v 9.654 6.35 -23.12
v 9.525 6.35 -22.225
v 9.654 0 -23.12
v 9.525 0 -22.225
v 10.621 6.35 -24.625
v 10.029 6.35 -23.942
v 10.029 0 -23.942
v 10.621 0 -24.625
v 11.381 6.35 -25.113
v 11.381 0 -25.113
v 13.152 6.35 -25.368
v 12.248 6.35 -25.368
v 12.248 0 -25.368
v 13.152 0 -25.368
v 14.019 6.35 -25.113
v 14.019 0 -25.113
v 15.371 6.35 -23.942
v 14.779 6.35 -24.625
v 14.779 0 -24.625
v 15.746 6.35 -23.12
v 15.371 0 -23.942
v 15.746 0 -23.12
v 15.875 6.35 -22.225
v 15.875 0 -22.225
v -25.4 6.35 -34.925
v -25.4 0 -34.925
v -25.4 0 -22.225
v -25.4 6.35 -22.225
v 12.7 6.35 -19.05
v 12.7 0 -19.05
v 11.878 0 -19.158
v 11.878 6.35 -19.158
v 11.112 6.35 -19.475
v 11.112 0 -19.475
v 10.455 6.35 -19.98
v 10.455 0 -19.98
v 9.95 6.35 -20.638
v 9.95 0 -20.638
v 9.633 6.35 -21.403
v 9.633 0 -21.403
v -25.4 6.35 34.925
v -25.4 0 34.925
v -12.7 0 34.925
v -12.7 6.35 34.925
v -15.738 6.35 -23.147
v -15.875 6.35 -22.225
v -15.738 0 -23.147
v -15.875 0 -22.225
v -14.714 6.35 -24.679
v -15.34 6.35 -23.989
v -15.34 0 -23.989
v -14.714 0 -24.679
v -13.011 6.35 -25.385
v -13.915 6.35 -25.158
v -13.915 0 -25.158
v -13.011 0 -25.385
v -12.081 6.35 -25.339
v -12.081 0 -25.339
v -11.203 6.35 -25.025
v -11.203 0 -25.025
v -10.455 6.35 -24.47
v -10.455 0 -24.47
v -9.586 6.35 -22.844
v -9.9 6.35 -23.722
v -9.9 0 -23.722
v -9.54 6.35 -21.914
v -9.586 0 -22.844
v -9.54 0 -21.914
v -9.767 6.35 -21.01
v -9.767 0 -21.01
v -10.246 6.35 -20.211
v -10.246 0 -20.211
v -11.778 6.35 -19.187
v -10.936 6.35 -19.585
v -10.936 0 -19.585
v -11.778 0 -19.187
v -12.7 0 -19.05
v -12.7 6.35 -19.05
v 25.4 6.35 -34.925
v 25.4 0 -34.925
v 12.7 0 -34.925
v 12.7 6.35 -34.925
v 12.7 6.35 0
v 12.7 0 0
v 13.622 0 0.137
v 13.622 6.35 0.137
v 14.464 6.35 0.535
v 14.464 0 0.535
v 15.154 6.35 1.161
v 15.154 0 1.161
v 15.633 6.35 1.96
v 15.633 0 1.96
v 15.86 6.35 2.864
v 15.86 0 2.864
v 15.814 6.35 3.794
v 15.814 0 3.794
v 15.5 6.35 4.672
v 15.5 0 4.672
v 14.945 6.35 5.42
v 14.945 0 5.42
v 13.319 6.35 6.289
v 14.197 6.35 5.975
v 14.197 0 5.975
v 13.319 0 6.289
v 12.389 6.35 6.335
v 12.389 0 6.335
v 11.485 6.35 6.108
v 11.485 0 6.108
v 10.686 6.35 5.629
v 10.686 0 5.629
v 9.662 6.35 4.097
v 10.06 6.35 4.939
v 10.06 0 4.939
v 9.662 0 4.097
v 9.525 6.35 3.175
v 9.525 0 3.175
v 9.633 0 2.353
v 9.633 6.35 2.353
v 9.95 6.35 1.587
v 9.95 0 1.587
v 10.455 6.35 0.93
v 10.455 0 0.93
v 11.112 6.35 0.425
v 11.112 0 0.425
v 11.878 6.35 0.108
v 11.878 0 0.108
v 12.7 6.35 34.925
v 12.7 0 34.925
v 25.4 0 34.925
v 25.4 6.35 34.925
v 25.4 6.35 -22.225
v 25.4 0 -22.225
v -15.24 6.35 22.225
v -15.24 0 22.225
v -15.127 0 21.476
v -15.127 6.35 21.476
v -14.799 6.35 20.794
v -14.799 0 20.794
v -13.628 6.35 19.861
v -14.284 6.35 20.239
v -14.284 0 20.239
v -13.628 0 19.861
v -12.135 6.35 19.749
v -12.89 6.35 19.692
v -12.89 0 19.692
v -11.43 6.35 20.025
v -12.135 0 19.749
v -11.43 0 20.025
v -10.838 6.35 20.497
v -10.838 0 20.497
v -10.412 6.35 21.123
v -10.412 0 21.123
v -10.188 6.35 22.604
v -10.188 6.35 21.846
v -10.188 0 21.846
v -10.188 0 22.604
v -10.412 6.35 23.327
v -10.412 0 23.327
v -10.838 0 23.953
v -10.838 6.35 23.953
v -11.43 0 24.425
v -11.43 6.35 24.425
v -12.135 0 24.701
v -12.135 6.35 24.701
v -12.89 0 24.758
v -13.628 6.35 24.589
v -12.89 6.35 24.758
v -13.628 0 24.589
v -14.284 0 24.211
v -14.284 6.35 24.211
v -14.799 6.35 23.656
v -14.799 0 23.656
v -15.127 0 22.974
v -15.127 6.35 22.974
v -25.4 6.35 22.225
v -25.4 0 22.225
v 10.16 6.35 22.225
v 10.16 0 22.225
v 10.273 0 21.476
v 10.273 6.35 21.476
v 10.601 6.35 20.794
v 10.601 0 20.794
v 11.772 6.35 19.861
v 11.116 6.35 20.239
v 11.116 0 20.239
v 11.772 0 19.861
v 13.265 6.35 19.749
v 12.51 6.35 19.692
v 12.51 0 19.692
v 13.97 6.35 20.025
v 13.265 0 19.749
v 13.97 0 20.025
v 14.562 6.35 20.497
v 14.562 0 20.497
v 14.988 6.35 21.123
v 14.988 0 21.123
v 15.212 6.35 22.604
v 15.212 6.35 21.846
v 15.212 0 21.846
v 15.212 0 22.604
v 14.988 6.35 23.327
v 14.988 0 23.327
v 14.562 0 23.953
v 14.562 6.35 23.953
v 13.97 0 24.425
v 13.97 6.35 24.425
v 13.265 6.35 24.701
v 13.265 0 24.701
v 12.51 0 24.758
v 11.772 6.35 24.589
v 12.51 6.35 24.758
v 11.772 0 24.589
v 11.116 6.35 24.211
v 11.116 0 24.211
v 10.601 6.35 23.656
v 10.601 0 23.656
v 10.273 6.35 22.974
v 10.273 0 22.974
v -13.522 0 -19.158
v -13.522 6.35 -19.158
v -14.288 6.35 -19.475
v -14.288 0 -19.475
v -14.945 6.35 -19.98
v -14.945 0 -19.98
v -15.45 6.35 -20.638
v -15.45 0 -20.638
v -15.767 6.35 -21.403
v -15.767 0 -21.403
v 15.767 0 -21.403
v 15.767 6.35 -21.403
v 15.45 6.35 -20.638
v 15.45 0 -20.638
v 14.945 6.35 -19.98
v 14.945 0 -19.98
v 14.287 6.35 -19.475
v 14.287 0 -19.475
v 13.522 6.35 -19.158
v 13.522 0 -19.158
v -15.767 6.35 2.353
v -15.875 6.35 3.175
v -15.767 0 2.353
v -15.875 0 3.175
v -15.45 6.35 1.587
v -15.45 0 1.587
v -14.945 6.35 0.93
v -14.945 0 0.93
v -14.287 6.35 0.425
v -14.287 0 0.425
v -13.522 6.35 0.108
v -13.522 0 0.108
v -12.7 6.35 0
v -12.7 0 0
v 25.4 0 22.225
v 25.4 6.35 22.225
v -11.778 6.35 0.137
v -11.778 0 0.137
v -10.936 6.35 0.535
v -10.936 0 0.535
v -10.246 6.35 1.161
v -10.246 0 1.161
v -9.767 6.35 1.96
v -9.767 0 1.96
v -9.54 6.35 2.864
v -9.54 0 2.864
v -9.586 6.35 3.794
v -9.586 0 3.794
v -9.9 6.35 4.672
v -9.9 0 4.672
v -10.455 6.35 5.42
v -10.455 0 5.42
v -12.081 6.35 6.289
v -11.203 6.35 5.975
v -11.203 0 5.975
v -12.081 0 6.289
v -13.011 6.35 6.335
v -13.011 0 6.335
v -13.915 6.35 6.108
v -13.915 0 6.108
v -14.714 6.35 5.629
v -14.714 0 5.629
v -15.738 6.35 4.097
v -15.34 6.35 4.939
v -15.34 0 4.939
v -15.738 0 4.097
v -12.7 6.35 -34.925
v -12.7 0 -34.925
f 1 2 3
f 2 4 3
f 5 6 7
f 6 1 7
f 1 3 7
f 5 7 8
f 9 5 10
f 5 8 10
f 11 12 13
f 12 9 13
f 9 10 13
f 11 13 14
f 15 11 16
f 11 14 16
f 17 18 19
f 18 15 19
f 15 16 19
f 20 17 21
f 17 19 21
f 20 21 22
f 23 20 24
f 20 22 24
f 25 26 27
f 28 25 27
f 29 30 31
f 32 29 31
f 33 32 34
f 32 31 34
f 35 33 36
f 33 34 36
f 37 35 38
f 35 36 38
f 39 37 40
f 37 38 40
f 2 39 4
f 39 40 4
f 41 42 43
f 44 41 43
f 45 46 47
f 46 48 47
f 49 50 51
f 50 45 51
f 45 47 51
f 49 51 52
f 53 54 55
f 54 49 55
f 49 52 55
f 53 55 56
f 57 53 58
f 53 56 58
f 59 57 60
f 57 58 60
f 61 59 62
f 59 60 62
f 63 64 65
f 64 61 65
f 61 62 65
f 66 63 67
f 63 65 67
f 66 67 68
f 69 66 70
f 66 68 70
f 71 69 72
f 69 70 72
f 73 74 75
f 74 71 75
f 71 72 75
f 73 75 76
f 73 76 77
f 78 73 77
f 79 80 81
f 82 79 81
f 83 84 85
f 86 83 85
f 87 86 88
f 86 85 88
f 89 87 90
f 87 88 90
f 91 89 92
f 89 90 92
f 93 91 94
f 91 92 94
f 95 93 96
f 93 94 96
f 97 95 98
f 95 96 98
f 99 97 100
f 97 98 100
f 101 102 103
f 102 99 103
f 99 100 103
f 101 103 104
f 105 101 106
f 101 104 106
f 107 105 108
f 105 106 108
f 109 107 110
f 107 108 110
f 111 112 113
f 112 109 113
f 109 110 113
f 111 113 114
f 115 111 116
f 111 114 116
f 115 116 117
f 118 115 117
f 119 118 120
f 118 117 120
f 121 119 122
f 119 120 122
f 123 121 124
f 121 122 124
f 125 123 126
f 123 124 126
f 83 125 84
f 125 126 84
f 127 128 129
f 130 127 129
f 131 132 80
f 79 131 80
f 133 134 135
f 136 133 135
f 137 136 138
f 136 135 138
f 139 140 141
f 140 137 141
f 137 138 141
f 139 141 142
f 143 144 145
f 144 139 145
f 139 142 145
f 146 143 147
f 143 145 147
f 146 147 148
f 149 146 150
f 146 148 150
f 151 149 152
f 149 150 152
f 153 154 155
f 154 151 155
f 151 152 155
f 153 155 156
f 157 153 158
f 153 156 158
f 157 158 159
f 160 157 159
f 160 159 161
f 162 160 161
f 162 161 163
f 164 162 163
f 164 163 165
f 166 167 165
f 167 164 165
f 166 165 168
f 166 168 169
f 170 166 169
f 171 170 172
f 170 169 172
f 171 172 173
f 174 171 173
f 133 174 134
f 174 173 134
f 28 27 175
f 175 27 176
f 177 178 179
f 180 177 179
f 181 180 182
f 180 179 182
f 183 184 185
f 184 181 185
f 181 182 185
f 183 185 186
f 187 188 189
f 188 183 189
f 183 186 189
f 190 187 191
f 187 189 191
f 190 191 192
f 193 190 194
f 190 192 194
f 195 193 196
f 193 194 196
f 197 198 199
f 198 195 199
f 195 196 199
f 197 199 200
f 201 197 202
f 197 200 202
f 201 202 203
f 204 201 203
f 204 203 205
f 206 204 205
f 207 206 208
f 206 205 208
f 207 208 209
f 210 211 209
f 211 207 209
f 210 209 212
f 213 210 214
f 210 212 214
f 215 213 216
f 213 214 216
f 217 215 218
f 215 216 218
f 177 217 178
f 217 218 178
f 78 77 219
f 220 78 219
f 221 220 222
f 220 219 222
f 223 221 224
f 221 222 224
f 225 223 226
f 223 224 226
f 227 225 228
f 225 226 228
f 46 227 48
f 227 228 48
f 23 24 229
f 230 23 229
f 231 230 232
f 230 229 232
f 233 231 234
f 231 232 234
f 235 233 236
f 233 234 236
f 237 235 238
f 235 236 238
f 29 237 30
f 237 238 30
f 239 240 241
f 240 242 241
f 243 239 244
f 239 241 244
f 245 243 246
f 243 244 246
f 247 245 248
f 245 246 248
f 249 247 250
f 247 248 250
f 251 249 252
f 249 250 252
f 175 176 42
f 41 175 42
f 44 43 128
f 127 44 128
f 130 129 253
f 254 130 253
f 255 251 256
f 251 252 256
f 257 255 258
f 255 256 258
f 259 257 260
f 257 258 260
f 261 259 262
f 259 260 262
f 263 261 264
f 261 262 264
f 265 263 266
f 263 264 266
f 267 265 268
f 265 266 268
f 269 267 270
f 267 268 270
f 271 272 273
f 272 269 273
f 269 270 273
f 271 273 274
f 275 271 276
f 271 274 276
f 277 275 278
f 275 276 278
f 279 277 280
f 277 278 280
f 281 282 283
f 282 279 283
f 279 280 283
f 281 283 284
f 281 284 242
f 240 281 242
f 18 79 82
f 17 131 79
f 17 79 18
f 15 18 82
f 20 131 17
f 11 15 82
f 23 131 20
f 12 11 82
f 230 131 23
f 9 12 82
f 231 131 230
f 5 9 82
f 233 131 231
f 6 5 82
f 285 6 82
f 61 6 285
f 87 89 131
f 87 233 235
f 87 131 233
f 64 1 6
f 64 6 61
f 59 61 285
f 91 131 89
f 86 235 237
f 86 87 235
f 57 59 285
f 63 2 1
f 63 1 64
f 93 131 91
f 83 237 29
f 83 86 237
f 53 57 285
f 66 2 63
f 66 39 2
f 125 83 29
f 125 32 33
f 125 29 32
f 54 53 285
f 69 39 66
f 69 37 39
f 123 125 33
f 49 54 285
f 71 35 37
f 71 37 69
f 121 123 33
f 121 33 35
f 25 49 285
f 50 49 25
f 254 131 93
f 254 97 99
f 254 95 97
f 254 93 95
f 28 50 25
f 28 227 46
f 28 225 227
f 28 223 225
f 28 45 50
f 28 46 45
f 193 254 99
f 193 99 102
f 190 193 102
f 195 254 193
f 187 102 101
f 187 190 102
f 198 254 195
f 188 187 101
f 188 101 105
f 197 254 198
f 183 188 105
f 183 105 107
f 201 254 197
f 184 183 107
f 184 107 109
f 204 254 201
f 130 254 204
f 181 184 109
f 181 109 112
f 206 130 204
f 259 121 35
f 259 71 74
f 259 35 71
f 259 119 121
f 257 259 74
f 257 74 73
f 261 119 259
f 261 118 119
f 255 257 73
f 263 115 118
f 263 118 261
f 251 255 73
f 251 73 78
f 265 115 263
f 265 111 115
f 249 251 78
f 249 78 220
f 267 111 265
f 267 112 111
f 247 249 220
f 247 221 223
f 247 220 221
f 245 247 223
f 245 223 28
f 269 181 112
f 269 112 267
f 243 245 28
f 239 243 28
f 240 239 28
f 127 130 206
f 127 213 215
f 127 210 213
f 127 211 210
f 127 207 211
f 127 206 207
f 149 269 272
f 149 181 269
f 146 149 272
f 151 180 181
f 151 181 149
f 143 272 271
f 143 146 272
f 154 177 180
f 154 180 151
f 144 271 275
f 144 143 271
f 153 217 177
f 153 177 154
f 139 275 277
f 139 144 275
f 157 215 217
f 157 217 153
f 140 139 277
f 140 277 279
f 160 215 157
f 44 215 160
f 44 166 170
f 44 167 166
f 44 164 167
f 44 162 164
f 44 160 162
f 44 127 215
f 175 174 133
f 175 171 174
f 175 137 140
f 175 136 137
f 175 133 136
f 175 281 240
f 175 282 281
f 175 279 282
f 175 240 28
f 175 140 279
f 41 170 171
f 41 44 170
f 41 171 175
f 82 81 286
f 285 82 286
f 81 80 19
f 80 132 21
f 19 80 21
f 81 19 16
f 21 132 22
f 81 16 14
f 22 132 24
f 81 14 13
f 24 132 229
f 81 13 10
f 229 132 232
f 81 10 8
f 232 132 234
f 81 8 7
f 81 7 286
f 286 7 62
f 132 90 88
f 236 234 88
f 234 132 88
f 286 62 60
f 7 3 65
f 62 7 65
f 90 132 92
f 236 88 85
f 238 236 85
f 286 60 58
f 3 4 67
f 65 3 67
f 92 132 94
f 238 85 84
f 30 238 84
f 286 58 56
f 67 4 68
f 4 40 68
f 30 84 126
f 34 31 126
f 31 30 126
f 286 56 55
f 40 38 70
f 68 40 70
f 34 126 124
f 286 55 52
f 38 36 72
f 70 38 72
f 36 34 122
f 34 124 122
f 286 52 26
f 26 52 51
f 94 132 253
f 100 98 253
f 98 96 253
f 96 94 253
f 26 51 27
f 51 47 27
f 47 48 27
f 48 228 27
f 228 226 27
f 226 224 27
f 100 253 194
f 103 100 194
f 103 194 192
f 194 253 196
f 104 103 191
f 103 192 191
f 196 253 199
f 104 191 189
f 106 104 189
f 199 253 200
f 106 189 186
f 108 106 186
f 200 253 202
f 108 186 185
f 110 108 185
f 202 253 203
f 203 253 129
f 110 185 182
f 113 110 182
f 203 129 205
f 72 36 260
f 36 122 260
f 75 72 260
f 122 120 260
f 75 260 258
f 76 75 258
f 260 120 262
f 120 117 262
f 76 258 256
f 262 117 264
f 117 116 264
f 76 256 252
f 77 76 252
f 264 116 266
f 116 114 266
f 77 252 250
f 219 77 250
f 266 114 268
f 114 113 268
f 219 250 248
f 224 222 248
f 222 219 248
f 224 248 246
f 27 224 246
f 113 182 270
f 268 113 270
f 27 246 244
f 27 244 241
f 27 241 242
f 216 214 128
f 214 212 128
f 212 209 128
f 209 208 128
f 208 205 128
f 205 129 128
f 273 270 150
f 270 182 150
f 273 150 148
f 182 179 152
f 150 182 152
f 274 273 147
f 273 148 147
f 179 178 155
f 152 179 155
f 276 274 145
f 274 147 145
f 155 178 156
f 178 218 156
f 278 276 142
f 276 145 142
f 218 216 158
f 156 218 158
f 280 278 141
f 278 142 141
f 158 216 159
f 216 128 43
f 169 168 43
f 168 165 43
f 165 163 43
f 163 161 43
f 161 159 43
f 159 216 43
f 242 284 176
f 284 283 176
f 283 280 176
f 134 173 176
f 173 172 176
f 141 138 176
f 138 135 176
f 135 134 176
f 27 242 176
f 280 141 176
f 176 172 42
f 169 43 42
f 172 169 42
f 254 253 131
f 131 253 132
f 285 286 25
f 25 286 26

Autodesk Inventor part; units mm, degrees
ref_plane "YZ Plane" through (0, 0, 0) normal (1, 0, 0) x (0, 1, 0)
ref_plane "XZ Plane" through (0, 0, 0) normal (0, 1, 0) x (-1, 0, 0)
ref_plane "XY Plane" through (0, 0, 0) normal (0, 0, 1) x (1, 0, 0)
sketch "Sketch1" plane through (0, 0, 0) normal (0, 1, 0) x (-1, 0, 0)
  line L0 (25.4, 34.925) -> (-25.4, 34.925)
  line L1 (-25.4, 34.925) -> (-25.4, -34.925)
  line L2 (-25.4, -34.925) -> (25.4, -34.925)
  line L3 (25.4, -34.925) -> (25.4, 34.925)
  line L4 (25.4, 34.925) -> (-25.4, -34.925) construction
  line L5 (-25.4, 34.925) -> (25.4, -34.925) construction
  line L6 (25.4, -34.925) -> (12.7, -34.925)
  line L7 (25.4, -22.225) -> (25.4, -34.925)
  line L8 (-25.4, -34.925) -> (-12.7, -34.925)
  line L9 (-12.7, -22.225) -> (-25.4, -22.225)
  line L10 (-25.4, -22.225) -> (-25.4, -34.925)
  line L11 (12.7, -22.225) -> (12.7, 3.175)
  line L12 (12.7, -22.225) -> (38.1, -22.225) construction
  line L13 (-12.7, -22.225) -> (-12.7, 3.175)
  line L14 (25.4, 34.925) -> (12.7, 34.925)
  line L15 (25.4, 22.225) -> (25.4, 34.925)
  line L16 (-25.4, 34.925) -> (-12.7, 34.925)
  line L17 (-25.4, 22.225) -> (-25.4, 34.925)
  circle A0 centre (12.7, 22.225) radius 2.54
  circle A1 centre (-12.7, 22.225) radius 2.54
  circle A2 centre (12.7, -22.225) radius 3.175
  circle A3 centre (-12.7, -22.225) radius 3.175
  circle A4 centre (12.7, 3.175) radius 3.175
  circle A5 centre (-12.7, 3.175) radius 3.175
  point P0 (0, 0)
  dimension "d0" = 50.8
  dimension "d1" = 69.85
  dimension "d2" = 12.7
  dimension "d3" = 12.7
  dimension "d4" = 12.7
  dimension "d5" = 12.7
  dimension "d6" = 25.4
  dimension "d7" = 90
  dimension "d8" = 25.4
  dimension "d13" = 5.08
  dimension "d14" = 5.08
  dimension "d15" = 6.35
  dimension "d16" = 6.35
  dimension "d17" = 6.35
  dimension "d18" = 6.35
extrude "Extrusion1" add sketch "Sketch1" along normal blind 6.35
properties part number "CatapultPlate"
